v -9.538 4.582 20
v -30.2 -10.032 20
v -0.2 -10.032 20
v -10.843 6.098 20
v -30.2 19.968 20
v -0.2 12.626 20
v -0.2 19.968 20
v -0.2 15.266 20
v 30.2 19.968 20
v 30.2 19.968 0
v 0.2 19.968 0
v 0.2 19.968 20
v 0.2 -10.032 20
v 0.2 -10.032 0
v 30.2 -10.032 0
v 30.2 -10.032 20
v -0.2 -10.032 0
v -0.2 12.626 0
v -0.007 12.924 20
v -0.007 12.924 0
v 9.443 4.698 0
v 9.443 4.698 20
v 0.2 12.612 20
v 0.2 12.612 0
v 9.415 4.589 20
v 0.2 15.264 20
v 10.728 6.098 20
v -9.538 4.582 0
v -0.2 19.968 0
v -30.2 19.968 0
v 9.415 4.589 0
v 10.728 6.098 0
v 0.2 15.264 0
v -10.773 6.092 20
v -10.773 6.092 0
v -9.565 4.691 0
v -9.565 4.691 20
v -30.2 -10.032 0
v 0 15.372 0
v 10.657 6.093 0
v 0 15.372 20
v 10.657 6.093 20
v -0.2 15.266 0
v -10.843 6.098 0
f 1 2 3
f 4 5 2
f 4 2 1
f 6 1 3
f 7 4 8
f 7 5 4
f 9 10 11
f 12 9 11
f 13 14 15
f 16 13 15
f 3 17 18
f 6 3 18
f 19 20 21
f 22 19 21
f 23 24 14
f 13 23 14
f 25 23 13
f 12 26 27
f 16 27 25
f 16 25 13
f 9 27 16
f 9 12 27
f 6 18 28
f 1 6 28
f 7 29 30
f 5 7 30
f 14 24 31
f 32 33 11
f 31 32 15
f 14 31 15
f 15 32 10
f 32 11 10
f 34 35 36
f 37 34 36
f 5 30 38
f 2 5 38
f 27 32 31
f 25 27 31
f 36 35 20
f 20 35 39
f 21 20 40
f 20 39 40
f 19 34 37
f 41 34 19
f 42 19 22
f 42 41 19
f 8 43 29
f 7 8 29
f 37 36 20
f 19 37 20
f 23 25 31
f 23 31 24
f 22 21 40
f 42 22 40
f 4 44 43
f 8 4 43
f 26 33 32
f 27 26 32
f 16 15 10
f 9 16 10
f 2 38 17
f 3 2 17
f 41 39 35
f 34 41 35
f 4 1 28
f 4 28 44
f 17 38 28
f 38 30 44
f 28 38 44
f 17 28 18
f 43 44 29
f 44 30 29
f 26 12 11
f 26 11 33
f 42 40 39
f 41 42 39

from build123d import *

# Parameters (mm, degrees)
F1_DEPTH = 20
F3_DEPTH = 20


# Not quite as in the source:
# - ends of sketch curves that miss each other by under 0.0002 mm in the source are joined


with BuildPart() as f1:
    # F0 (on Top) → F1 (new body)
    with BuildSketch(Plane.XY):
        Polygon((-0.2, 19.9680037051), (-30.2, 19.9680037051), (-30.2, -10.0319962949), (-0.2, -10.0319962949), (-0.2, 12.6258979241), (-9.537948603, 4.5824087189), (-10.8432257548, 6.0977474786), (-0.2, 15.2655717093), align=None)
    extrude(amount=F1_DEPTH)


with BuildPart() as f1b:
    # F0 (on Top) → F1, piece 2 (new body)
    with BuildSketch(Plane.XY):
        Polygon((0.2, 19.9680037051), (0.2, 15.2637217937), (10.7280267403, 6.0977474786), (9.4147583618, 4.5893290465), (0.2, 12.6119377033), (0.2, -10.0319962949), (30.2, -10.0319962949), (30.2, 19.9680037051), align=None)
    extrude(amount=F1_DEPTH)


with BuildPart() as f3:
    # F2 (on Top) → F3 (new body)
    with BuildSketch(Plane.XY):
        Polygon((-10.772710357, 6.0924959384), (-9.5653289916, 4.6908075856), (-0.0066424788, 12.9244352324), (9.44271132, 4.6975816776), (10.65748457, 6.0928687273), (-0.0001748021, 15.3717045883), align=None)
    extrude(amount=F3_DEPTH)


solid = Compound([f1.part, f1b.part, f3.part])
